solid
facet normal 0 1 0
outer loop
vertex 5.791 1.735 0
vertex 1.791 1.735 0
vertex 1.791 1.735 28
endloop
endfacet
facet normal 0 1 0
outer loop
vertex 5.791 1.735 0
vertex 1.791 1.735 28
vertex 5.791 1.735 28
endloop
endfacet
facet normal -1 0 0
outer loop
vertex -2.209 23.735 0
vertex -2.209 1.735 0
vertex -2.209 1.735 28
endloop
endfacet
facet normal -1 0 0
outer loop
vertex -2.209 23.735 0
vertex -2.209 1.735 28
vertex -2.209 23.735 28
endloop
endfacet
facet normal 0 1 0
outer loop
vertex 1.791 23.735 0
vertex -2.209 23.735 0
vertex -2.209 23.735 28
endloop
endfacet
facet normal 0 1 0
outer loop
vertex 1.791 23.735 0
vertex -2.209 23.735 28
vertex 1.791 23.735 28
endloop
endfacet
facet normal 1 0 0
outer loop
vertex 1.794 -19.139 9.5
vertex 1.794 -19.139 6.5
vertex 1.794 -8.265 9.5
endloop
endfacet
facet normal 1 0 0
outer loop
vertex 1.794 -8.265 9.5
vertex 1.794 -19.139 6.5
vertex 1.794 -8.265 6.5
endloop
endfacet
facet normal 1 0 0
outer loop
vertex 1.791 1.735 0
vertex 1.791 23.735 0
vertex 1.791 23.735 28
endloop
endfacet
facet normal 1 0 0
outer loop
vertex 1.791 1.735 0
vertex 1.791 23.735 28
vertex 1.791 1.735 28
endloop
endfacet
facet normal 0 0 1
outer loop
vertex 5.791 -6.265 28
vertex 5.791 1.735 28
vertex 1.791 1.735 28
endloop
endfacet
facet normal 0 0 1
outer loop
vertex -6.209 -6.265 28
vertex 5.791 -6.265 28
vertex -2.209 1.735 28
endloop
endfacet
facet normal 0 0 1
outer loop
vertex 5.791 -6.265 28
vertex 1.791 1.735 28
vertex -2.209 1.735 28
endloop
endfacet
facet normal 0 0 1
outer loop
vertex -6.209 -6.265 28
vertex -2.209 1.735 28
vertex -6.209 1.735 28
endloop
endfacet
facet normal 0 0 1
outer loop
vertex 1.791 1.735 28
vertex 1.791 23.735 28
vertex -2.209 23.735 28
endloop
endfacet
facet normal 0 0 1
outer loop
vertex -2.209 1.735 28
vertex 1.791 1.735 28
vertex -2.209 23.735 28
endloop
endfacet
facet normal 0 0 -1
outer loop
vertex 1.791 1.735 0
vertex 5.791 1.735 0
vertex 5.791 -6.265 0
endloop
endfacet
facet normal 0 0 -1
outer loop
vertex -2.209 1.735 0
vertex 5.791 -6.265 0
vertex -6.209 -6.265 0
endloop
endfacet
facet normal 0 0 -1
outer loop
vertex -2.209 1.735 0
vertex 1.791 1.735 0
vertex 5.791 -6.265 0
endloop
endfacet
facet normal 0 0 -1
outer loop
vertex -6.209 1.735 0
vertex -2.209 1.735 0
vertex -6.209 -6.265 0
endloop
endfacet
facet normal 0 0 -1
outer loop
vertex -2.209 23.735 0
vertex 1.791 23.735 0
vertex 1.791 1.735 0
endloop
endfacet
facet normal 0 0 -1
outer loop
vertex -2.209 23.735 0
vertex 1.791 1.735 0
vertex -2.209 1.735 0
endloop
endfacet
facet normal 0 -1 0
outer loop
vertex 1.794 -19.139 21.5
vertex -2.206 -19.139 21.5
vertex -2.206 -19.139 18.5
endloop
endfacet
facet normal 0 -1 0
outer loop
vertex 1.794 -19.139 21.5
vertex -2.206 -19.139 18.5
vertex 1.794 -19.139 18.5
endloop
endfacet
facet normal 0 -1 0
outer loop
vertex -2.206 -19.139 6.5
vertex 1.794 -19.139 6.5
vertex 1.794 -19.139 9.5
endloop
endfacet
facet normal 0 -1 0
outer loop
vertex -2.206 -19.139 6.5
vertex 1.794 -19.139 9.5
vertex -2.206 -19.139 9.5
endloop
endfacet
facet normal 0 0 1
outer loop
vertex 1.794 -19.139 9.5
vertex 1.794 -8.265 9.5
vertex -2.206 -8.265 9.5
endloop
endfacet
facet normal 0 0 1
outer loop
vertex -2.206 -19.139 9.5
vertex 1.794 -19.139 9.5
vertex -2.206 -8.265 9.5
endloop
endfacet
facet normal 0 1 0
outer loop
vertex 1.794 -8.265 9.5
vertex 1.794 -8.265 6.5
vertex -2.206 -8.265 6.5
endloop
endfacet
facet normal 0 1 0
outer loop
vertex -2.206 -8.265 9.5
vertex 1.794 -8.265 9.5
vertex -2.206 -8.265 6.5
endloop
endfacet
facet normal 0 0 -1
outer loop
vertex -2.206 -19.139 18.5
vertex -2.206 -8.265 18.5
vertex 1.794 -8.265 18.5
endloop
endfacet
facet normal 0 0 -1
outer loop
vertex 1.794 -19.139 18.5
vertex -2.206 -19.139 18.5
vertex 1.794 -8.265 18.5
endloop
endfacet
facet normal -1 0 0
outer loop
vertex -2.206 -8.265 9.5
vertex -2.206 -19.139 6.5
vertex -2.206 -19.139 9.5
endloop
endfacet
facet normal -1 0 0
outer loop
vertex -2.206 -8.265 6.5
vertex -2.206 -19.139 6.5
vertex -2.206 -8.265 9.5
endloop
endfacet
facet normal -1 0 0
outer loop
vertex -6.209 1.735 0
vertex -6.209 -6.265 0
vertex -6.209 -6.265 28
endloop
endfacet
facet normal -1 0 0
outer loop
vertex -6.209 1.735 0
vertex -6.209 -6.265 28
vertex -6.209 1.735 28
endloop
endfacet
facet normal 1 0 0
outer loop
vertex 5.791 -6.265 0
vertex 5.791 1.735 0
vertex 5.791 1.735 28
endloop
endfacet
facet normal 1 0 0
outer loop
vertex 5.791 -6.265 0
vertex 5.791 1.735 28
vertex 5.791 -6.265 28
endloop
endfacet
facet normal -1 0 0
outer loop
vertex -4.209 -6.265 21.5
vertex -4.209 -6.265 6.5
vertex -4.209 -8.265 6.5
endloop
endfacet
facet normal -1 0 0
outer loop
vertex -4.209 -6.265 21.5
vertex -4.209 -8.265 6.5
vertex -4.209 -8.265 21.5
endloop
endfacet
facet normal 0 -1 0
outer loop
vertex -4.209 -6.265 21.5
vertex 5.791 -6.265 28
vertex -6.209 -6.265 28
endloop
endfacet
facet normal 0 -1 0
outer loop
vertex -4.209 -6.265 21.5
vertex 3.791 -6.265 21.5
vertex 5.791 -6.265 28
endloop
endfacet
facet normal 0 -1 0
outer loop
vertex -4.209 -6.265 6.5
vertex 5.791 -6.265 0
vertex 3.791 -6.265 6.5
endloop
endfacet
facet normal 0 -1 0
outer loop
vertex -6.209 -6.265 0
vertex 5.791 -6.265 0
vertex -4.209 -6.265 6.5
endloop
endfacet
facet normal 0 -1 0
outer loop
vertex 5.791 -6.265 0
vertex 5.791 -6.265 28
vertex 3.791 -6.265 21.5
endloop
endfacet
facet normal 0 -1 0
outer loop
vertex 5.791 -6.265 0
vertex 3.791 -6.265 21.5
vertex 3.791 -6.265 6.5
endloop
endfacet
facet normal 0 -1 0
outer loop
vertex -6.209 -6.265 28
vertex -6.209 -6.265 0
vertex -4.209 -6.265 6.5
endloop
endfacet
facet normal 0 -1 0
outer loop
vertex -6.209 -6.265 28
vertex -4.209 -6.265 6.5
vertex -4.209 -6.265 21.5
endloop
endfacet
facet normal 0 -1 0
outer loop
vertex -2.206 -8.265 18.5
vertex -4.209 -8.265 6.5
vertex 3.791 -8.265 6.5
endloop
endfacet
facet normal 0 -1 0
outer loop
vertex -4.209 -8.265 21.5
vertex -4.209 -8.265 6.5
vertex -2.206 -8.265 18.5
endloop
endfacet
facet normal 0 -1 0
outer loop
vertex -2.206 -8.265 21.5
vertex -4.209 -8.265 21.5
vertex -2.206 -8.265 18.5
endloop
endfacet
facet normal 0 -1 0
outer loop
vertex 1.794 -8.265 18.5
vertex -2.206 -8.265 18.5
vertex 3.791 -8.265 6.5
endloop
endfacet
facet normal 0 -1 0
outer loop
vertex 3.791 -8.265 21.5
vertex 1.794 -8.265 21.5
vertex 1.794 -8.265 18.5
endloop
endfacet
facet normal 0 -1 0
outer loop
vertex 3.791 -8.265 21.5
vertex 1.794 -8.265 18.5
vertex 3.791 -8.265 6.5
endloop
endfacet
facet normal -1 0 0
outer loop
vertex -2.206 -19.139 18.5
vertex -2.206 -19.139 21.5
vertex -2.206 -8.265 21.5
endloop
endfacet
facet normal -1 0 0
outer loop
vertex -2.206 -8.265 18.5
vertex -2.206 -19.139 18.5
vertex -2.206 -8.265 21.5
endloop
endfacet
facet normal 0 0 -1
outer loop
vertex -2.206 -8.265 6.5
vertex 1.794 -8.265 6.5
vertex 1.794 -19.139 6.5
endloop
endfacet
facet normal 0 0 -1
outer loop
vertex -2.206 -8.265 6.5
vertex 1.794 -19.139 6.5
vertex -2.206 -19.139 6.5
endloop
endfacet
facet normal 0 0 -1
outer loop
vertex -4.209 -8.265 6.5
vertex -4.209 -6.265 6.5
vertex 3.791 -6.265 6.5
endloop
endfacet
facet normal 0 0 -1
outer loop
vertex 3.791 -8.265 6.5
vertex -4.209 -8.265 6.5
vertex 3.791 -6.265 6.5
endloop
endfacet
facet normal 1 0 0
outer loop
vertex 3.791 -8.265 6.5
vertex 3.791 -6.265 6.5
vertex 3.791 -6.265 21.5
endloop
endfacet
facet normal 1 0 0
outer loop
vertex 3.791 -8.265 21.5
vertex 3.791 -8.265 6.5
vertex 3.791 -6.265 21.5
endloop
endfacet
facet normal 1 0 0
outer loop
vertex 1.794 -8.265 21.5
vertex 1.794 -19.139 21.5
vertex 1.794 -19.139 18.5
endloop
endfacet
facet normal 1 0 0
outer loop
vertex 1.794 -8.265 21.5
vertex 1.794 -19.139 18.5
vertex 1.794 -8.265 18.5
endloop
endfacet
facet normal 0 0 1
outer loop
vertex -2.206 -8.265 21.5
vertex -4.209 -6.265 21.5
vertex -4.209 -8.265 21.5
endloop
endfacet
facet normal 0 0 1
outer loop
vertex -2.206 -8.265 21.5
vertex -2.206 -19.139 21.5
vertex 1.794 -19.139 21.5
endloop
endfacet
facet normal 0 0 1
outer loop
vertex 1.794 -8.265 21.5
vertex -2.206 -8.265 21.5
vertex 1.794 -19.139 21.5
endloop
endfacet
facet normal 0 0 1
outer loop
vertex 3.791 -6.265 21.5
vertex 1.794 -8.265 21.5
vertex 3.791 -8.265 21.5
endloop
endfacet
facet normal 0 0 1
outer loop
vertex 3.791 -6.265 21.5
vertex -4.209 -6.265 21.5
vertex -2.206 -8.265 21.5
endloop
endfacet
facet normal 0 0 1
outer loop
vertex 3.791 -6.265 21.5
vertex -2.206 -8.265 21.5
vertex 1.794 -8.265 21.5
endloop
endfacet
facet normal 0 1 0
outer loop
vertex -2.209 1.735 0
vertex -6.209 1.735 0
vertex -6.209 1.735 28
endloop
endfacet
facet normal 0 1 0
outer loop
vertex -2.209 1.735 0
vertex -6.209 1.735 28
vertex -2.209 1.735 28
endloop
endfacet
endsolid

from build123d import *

# Parameters (mm, degrees)
BOSS_EXTRUDE1_DEPTH = 28
SKETCH2_W           = 8
SKETCH2_H           = 15
BOSS_EXTRUDE2_DEPTH = 2
SKETCH3_W           = 4
SKETCH3_H           = 10.874014098
BOSS_EXTRUDE3_DEPTH = 3
SKETCH5_W           = 4
SKETCH5_H           = 10.874014098
BOSS_EXTRUDE4_DEPTH = 3


with BuildPart() as part:
    # Sketch1 → Boss-Extrude1 (new body)
    with BuildSketch(Plane.XY):
        Polygon((-2.208632101, 1.734693878), (-2.208632101, 23.734693878), (1.791367899, 23.734693878), (1.791367899, 1.734693878), (5.791367899, 1.734693878), (5.791367899, -6.265306122), (-6.208632101, -6.265306122), (-6.208632101, 1.734693878), align=None)
    extrude(amount=BOSS_EXTRUDE1_DEPTH)

    # Sketch2 → Boss-Extrude2 (add)
    with BuildSketch(Plane.XZ.offset(6.265306122)):
        with Locations((-0.208632101, 14)):
            Rectangle(SKETCH2_W, SKETCH2_H)
    extrude(amount=BOSS_EXTRUDE2_DEPTH)

    # Sketch3 → Boss-Extrude3 (add)
    with BuildSketch(Plane.XY.offset(21.5)):
        with Locations((-0.20614541, -13.702313171)):
            Rectangle(SKETCH3_W, SKETCH3_H)
    extrude(amount=-BOSS_EXTRUDE3_DEPTH)


with BuildPart() as body_2:
    # Sketch5 → Boss-Extrude4 (new body)
    with BuildSketch(Plane(origin=(0, 0, 6.5), x_dir=(-1, 0, 0), z_dir=(0, 0, -1))):
        with Locations((0.20614541, -13.702313171)):
            Rectangle(SKETCH5_W, SKETCH5_H)
    extrude(amount=-BOSS_EXTRUDE4_DEPTH)


solid = Compound([part.part, body_2.part])
